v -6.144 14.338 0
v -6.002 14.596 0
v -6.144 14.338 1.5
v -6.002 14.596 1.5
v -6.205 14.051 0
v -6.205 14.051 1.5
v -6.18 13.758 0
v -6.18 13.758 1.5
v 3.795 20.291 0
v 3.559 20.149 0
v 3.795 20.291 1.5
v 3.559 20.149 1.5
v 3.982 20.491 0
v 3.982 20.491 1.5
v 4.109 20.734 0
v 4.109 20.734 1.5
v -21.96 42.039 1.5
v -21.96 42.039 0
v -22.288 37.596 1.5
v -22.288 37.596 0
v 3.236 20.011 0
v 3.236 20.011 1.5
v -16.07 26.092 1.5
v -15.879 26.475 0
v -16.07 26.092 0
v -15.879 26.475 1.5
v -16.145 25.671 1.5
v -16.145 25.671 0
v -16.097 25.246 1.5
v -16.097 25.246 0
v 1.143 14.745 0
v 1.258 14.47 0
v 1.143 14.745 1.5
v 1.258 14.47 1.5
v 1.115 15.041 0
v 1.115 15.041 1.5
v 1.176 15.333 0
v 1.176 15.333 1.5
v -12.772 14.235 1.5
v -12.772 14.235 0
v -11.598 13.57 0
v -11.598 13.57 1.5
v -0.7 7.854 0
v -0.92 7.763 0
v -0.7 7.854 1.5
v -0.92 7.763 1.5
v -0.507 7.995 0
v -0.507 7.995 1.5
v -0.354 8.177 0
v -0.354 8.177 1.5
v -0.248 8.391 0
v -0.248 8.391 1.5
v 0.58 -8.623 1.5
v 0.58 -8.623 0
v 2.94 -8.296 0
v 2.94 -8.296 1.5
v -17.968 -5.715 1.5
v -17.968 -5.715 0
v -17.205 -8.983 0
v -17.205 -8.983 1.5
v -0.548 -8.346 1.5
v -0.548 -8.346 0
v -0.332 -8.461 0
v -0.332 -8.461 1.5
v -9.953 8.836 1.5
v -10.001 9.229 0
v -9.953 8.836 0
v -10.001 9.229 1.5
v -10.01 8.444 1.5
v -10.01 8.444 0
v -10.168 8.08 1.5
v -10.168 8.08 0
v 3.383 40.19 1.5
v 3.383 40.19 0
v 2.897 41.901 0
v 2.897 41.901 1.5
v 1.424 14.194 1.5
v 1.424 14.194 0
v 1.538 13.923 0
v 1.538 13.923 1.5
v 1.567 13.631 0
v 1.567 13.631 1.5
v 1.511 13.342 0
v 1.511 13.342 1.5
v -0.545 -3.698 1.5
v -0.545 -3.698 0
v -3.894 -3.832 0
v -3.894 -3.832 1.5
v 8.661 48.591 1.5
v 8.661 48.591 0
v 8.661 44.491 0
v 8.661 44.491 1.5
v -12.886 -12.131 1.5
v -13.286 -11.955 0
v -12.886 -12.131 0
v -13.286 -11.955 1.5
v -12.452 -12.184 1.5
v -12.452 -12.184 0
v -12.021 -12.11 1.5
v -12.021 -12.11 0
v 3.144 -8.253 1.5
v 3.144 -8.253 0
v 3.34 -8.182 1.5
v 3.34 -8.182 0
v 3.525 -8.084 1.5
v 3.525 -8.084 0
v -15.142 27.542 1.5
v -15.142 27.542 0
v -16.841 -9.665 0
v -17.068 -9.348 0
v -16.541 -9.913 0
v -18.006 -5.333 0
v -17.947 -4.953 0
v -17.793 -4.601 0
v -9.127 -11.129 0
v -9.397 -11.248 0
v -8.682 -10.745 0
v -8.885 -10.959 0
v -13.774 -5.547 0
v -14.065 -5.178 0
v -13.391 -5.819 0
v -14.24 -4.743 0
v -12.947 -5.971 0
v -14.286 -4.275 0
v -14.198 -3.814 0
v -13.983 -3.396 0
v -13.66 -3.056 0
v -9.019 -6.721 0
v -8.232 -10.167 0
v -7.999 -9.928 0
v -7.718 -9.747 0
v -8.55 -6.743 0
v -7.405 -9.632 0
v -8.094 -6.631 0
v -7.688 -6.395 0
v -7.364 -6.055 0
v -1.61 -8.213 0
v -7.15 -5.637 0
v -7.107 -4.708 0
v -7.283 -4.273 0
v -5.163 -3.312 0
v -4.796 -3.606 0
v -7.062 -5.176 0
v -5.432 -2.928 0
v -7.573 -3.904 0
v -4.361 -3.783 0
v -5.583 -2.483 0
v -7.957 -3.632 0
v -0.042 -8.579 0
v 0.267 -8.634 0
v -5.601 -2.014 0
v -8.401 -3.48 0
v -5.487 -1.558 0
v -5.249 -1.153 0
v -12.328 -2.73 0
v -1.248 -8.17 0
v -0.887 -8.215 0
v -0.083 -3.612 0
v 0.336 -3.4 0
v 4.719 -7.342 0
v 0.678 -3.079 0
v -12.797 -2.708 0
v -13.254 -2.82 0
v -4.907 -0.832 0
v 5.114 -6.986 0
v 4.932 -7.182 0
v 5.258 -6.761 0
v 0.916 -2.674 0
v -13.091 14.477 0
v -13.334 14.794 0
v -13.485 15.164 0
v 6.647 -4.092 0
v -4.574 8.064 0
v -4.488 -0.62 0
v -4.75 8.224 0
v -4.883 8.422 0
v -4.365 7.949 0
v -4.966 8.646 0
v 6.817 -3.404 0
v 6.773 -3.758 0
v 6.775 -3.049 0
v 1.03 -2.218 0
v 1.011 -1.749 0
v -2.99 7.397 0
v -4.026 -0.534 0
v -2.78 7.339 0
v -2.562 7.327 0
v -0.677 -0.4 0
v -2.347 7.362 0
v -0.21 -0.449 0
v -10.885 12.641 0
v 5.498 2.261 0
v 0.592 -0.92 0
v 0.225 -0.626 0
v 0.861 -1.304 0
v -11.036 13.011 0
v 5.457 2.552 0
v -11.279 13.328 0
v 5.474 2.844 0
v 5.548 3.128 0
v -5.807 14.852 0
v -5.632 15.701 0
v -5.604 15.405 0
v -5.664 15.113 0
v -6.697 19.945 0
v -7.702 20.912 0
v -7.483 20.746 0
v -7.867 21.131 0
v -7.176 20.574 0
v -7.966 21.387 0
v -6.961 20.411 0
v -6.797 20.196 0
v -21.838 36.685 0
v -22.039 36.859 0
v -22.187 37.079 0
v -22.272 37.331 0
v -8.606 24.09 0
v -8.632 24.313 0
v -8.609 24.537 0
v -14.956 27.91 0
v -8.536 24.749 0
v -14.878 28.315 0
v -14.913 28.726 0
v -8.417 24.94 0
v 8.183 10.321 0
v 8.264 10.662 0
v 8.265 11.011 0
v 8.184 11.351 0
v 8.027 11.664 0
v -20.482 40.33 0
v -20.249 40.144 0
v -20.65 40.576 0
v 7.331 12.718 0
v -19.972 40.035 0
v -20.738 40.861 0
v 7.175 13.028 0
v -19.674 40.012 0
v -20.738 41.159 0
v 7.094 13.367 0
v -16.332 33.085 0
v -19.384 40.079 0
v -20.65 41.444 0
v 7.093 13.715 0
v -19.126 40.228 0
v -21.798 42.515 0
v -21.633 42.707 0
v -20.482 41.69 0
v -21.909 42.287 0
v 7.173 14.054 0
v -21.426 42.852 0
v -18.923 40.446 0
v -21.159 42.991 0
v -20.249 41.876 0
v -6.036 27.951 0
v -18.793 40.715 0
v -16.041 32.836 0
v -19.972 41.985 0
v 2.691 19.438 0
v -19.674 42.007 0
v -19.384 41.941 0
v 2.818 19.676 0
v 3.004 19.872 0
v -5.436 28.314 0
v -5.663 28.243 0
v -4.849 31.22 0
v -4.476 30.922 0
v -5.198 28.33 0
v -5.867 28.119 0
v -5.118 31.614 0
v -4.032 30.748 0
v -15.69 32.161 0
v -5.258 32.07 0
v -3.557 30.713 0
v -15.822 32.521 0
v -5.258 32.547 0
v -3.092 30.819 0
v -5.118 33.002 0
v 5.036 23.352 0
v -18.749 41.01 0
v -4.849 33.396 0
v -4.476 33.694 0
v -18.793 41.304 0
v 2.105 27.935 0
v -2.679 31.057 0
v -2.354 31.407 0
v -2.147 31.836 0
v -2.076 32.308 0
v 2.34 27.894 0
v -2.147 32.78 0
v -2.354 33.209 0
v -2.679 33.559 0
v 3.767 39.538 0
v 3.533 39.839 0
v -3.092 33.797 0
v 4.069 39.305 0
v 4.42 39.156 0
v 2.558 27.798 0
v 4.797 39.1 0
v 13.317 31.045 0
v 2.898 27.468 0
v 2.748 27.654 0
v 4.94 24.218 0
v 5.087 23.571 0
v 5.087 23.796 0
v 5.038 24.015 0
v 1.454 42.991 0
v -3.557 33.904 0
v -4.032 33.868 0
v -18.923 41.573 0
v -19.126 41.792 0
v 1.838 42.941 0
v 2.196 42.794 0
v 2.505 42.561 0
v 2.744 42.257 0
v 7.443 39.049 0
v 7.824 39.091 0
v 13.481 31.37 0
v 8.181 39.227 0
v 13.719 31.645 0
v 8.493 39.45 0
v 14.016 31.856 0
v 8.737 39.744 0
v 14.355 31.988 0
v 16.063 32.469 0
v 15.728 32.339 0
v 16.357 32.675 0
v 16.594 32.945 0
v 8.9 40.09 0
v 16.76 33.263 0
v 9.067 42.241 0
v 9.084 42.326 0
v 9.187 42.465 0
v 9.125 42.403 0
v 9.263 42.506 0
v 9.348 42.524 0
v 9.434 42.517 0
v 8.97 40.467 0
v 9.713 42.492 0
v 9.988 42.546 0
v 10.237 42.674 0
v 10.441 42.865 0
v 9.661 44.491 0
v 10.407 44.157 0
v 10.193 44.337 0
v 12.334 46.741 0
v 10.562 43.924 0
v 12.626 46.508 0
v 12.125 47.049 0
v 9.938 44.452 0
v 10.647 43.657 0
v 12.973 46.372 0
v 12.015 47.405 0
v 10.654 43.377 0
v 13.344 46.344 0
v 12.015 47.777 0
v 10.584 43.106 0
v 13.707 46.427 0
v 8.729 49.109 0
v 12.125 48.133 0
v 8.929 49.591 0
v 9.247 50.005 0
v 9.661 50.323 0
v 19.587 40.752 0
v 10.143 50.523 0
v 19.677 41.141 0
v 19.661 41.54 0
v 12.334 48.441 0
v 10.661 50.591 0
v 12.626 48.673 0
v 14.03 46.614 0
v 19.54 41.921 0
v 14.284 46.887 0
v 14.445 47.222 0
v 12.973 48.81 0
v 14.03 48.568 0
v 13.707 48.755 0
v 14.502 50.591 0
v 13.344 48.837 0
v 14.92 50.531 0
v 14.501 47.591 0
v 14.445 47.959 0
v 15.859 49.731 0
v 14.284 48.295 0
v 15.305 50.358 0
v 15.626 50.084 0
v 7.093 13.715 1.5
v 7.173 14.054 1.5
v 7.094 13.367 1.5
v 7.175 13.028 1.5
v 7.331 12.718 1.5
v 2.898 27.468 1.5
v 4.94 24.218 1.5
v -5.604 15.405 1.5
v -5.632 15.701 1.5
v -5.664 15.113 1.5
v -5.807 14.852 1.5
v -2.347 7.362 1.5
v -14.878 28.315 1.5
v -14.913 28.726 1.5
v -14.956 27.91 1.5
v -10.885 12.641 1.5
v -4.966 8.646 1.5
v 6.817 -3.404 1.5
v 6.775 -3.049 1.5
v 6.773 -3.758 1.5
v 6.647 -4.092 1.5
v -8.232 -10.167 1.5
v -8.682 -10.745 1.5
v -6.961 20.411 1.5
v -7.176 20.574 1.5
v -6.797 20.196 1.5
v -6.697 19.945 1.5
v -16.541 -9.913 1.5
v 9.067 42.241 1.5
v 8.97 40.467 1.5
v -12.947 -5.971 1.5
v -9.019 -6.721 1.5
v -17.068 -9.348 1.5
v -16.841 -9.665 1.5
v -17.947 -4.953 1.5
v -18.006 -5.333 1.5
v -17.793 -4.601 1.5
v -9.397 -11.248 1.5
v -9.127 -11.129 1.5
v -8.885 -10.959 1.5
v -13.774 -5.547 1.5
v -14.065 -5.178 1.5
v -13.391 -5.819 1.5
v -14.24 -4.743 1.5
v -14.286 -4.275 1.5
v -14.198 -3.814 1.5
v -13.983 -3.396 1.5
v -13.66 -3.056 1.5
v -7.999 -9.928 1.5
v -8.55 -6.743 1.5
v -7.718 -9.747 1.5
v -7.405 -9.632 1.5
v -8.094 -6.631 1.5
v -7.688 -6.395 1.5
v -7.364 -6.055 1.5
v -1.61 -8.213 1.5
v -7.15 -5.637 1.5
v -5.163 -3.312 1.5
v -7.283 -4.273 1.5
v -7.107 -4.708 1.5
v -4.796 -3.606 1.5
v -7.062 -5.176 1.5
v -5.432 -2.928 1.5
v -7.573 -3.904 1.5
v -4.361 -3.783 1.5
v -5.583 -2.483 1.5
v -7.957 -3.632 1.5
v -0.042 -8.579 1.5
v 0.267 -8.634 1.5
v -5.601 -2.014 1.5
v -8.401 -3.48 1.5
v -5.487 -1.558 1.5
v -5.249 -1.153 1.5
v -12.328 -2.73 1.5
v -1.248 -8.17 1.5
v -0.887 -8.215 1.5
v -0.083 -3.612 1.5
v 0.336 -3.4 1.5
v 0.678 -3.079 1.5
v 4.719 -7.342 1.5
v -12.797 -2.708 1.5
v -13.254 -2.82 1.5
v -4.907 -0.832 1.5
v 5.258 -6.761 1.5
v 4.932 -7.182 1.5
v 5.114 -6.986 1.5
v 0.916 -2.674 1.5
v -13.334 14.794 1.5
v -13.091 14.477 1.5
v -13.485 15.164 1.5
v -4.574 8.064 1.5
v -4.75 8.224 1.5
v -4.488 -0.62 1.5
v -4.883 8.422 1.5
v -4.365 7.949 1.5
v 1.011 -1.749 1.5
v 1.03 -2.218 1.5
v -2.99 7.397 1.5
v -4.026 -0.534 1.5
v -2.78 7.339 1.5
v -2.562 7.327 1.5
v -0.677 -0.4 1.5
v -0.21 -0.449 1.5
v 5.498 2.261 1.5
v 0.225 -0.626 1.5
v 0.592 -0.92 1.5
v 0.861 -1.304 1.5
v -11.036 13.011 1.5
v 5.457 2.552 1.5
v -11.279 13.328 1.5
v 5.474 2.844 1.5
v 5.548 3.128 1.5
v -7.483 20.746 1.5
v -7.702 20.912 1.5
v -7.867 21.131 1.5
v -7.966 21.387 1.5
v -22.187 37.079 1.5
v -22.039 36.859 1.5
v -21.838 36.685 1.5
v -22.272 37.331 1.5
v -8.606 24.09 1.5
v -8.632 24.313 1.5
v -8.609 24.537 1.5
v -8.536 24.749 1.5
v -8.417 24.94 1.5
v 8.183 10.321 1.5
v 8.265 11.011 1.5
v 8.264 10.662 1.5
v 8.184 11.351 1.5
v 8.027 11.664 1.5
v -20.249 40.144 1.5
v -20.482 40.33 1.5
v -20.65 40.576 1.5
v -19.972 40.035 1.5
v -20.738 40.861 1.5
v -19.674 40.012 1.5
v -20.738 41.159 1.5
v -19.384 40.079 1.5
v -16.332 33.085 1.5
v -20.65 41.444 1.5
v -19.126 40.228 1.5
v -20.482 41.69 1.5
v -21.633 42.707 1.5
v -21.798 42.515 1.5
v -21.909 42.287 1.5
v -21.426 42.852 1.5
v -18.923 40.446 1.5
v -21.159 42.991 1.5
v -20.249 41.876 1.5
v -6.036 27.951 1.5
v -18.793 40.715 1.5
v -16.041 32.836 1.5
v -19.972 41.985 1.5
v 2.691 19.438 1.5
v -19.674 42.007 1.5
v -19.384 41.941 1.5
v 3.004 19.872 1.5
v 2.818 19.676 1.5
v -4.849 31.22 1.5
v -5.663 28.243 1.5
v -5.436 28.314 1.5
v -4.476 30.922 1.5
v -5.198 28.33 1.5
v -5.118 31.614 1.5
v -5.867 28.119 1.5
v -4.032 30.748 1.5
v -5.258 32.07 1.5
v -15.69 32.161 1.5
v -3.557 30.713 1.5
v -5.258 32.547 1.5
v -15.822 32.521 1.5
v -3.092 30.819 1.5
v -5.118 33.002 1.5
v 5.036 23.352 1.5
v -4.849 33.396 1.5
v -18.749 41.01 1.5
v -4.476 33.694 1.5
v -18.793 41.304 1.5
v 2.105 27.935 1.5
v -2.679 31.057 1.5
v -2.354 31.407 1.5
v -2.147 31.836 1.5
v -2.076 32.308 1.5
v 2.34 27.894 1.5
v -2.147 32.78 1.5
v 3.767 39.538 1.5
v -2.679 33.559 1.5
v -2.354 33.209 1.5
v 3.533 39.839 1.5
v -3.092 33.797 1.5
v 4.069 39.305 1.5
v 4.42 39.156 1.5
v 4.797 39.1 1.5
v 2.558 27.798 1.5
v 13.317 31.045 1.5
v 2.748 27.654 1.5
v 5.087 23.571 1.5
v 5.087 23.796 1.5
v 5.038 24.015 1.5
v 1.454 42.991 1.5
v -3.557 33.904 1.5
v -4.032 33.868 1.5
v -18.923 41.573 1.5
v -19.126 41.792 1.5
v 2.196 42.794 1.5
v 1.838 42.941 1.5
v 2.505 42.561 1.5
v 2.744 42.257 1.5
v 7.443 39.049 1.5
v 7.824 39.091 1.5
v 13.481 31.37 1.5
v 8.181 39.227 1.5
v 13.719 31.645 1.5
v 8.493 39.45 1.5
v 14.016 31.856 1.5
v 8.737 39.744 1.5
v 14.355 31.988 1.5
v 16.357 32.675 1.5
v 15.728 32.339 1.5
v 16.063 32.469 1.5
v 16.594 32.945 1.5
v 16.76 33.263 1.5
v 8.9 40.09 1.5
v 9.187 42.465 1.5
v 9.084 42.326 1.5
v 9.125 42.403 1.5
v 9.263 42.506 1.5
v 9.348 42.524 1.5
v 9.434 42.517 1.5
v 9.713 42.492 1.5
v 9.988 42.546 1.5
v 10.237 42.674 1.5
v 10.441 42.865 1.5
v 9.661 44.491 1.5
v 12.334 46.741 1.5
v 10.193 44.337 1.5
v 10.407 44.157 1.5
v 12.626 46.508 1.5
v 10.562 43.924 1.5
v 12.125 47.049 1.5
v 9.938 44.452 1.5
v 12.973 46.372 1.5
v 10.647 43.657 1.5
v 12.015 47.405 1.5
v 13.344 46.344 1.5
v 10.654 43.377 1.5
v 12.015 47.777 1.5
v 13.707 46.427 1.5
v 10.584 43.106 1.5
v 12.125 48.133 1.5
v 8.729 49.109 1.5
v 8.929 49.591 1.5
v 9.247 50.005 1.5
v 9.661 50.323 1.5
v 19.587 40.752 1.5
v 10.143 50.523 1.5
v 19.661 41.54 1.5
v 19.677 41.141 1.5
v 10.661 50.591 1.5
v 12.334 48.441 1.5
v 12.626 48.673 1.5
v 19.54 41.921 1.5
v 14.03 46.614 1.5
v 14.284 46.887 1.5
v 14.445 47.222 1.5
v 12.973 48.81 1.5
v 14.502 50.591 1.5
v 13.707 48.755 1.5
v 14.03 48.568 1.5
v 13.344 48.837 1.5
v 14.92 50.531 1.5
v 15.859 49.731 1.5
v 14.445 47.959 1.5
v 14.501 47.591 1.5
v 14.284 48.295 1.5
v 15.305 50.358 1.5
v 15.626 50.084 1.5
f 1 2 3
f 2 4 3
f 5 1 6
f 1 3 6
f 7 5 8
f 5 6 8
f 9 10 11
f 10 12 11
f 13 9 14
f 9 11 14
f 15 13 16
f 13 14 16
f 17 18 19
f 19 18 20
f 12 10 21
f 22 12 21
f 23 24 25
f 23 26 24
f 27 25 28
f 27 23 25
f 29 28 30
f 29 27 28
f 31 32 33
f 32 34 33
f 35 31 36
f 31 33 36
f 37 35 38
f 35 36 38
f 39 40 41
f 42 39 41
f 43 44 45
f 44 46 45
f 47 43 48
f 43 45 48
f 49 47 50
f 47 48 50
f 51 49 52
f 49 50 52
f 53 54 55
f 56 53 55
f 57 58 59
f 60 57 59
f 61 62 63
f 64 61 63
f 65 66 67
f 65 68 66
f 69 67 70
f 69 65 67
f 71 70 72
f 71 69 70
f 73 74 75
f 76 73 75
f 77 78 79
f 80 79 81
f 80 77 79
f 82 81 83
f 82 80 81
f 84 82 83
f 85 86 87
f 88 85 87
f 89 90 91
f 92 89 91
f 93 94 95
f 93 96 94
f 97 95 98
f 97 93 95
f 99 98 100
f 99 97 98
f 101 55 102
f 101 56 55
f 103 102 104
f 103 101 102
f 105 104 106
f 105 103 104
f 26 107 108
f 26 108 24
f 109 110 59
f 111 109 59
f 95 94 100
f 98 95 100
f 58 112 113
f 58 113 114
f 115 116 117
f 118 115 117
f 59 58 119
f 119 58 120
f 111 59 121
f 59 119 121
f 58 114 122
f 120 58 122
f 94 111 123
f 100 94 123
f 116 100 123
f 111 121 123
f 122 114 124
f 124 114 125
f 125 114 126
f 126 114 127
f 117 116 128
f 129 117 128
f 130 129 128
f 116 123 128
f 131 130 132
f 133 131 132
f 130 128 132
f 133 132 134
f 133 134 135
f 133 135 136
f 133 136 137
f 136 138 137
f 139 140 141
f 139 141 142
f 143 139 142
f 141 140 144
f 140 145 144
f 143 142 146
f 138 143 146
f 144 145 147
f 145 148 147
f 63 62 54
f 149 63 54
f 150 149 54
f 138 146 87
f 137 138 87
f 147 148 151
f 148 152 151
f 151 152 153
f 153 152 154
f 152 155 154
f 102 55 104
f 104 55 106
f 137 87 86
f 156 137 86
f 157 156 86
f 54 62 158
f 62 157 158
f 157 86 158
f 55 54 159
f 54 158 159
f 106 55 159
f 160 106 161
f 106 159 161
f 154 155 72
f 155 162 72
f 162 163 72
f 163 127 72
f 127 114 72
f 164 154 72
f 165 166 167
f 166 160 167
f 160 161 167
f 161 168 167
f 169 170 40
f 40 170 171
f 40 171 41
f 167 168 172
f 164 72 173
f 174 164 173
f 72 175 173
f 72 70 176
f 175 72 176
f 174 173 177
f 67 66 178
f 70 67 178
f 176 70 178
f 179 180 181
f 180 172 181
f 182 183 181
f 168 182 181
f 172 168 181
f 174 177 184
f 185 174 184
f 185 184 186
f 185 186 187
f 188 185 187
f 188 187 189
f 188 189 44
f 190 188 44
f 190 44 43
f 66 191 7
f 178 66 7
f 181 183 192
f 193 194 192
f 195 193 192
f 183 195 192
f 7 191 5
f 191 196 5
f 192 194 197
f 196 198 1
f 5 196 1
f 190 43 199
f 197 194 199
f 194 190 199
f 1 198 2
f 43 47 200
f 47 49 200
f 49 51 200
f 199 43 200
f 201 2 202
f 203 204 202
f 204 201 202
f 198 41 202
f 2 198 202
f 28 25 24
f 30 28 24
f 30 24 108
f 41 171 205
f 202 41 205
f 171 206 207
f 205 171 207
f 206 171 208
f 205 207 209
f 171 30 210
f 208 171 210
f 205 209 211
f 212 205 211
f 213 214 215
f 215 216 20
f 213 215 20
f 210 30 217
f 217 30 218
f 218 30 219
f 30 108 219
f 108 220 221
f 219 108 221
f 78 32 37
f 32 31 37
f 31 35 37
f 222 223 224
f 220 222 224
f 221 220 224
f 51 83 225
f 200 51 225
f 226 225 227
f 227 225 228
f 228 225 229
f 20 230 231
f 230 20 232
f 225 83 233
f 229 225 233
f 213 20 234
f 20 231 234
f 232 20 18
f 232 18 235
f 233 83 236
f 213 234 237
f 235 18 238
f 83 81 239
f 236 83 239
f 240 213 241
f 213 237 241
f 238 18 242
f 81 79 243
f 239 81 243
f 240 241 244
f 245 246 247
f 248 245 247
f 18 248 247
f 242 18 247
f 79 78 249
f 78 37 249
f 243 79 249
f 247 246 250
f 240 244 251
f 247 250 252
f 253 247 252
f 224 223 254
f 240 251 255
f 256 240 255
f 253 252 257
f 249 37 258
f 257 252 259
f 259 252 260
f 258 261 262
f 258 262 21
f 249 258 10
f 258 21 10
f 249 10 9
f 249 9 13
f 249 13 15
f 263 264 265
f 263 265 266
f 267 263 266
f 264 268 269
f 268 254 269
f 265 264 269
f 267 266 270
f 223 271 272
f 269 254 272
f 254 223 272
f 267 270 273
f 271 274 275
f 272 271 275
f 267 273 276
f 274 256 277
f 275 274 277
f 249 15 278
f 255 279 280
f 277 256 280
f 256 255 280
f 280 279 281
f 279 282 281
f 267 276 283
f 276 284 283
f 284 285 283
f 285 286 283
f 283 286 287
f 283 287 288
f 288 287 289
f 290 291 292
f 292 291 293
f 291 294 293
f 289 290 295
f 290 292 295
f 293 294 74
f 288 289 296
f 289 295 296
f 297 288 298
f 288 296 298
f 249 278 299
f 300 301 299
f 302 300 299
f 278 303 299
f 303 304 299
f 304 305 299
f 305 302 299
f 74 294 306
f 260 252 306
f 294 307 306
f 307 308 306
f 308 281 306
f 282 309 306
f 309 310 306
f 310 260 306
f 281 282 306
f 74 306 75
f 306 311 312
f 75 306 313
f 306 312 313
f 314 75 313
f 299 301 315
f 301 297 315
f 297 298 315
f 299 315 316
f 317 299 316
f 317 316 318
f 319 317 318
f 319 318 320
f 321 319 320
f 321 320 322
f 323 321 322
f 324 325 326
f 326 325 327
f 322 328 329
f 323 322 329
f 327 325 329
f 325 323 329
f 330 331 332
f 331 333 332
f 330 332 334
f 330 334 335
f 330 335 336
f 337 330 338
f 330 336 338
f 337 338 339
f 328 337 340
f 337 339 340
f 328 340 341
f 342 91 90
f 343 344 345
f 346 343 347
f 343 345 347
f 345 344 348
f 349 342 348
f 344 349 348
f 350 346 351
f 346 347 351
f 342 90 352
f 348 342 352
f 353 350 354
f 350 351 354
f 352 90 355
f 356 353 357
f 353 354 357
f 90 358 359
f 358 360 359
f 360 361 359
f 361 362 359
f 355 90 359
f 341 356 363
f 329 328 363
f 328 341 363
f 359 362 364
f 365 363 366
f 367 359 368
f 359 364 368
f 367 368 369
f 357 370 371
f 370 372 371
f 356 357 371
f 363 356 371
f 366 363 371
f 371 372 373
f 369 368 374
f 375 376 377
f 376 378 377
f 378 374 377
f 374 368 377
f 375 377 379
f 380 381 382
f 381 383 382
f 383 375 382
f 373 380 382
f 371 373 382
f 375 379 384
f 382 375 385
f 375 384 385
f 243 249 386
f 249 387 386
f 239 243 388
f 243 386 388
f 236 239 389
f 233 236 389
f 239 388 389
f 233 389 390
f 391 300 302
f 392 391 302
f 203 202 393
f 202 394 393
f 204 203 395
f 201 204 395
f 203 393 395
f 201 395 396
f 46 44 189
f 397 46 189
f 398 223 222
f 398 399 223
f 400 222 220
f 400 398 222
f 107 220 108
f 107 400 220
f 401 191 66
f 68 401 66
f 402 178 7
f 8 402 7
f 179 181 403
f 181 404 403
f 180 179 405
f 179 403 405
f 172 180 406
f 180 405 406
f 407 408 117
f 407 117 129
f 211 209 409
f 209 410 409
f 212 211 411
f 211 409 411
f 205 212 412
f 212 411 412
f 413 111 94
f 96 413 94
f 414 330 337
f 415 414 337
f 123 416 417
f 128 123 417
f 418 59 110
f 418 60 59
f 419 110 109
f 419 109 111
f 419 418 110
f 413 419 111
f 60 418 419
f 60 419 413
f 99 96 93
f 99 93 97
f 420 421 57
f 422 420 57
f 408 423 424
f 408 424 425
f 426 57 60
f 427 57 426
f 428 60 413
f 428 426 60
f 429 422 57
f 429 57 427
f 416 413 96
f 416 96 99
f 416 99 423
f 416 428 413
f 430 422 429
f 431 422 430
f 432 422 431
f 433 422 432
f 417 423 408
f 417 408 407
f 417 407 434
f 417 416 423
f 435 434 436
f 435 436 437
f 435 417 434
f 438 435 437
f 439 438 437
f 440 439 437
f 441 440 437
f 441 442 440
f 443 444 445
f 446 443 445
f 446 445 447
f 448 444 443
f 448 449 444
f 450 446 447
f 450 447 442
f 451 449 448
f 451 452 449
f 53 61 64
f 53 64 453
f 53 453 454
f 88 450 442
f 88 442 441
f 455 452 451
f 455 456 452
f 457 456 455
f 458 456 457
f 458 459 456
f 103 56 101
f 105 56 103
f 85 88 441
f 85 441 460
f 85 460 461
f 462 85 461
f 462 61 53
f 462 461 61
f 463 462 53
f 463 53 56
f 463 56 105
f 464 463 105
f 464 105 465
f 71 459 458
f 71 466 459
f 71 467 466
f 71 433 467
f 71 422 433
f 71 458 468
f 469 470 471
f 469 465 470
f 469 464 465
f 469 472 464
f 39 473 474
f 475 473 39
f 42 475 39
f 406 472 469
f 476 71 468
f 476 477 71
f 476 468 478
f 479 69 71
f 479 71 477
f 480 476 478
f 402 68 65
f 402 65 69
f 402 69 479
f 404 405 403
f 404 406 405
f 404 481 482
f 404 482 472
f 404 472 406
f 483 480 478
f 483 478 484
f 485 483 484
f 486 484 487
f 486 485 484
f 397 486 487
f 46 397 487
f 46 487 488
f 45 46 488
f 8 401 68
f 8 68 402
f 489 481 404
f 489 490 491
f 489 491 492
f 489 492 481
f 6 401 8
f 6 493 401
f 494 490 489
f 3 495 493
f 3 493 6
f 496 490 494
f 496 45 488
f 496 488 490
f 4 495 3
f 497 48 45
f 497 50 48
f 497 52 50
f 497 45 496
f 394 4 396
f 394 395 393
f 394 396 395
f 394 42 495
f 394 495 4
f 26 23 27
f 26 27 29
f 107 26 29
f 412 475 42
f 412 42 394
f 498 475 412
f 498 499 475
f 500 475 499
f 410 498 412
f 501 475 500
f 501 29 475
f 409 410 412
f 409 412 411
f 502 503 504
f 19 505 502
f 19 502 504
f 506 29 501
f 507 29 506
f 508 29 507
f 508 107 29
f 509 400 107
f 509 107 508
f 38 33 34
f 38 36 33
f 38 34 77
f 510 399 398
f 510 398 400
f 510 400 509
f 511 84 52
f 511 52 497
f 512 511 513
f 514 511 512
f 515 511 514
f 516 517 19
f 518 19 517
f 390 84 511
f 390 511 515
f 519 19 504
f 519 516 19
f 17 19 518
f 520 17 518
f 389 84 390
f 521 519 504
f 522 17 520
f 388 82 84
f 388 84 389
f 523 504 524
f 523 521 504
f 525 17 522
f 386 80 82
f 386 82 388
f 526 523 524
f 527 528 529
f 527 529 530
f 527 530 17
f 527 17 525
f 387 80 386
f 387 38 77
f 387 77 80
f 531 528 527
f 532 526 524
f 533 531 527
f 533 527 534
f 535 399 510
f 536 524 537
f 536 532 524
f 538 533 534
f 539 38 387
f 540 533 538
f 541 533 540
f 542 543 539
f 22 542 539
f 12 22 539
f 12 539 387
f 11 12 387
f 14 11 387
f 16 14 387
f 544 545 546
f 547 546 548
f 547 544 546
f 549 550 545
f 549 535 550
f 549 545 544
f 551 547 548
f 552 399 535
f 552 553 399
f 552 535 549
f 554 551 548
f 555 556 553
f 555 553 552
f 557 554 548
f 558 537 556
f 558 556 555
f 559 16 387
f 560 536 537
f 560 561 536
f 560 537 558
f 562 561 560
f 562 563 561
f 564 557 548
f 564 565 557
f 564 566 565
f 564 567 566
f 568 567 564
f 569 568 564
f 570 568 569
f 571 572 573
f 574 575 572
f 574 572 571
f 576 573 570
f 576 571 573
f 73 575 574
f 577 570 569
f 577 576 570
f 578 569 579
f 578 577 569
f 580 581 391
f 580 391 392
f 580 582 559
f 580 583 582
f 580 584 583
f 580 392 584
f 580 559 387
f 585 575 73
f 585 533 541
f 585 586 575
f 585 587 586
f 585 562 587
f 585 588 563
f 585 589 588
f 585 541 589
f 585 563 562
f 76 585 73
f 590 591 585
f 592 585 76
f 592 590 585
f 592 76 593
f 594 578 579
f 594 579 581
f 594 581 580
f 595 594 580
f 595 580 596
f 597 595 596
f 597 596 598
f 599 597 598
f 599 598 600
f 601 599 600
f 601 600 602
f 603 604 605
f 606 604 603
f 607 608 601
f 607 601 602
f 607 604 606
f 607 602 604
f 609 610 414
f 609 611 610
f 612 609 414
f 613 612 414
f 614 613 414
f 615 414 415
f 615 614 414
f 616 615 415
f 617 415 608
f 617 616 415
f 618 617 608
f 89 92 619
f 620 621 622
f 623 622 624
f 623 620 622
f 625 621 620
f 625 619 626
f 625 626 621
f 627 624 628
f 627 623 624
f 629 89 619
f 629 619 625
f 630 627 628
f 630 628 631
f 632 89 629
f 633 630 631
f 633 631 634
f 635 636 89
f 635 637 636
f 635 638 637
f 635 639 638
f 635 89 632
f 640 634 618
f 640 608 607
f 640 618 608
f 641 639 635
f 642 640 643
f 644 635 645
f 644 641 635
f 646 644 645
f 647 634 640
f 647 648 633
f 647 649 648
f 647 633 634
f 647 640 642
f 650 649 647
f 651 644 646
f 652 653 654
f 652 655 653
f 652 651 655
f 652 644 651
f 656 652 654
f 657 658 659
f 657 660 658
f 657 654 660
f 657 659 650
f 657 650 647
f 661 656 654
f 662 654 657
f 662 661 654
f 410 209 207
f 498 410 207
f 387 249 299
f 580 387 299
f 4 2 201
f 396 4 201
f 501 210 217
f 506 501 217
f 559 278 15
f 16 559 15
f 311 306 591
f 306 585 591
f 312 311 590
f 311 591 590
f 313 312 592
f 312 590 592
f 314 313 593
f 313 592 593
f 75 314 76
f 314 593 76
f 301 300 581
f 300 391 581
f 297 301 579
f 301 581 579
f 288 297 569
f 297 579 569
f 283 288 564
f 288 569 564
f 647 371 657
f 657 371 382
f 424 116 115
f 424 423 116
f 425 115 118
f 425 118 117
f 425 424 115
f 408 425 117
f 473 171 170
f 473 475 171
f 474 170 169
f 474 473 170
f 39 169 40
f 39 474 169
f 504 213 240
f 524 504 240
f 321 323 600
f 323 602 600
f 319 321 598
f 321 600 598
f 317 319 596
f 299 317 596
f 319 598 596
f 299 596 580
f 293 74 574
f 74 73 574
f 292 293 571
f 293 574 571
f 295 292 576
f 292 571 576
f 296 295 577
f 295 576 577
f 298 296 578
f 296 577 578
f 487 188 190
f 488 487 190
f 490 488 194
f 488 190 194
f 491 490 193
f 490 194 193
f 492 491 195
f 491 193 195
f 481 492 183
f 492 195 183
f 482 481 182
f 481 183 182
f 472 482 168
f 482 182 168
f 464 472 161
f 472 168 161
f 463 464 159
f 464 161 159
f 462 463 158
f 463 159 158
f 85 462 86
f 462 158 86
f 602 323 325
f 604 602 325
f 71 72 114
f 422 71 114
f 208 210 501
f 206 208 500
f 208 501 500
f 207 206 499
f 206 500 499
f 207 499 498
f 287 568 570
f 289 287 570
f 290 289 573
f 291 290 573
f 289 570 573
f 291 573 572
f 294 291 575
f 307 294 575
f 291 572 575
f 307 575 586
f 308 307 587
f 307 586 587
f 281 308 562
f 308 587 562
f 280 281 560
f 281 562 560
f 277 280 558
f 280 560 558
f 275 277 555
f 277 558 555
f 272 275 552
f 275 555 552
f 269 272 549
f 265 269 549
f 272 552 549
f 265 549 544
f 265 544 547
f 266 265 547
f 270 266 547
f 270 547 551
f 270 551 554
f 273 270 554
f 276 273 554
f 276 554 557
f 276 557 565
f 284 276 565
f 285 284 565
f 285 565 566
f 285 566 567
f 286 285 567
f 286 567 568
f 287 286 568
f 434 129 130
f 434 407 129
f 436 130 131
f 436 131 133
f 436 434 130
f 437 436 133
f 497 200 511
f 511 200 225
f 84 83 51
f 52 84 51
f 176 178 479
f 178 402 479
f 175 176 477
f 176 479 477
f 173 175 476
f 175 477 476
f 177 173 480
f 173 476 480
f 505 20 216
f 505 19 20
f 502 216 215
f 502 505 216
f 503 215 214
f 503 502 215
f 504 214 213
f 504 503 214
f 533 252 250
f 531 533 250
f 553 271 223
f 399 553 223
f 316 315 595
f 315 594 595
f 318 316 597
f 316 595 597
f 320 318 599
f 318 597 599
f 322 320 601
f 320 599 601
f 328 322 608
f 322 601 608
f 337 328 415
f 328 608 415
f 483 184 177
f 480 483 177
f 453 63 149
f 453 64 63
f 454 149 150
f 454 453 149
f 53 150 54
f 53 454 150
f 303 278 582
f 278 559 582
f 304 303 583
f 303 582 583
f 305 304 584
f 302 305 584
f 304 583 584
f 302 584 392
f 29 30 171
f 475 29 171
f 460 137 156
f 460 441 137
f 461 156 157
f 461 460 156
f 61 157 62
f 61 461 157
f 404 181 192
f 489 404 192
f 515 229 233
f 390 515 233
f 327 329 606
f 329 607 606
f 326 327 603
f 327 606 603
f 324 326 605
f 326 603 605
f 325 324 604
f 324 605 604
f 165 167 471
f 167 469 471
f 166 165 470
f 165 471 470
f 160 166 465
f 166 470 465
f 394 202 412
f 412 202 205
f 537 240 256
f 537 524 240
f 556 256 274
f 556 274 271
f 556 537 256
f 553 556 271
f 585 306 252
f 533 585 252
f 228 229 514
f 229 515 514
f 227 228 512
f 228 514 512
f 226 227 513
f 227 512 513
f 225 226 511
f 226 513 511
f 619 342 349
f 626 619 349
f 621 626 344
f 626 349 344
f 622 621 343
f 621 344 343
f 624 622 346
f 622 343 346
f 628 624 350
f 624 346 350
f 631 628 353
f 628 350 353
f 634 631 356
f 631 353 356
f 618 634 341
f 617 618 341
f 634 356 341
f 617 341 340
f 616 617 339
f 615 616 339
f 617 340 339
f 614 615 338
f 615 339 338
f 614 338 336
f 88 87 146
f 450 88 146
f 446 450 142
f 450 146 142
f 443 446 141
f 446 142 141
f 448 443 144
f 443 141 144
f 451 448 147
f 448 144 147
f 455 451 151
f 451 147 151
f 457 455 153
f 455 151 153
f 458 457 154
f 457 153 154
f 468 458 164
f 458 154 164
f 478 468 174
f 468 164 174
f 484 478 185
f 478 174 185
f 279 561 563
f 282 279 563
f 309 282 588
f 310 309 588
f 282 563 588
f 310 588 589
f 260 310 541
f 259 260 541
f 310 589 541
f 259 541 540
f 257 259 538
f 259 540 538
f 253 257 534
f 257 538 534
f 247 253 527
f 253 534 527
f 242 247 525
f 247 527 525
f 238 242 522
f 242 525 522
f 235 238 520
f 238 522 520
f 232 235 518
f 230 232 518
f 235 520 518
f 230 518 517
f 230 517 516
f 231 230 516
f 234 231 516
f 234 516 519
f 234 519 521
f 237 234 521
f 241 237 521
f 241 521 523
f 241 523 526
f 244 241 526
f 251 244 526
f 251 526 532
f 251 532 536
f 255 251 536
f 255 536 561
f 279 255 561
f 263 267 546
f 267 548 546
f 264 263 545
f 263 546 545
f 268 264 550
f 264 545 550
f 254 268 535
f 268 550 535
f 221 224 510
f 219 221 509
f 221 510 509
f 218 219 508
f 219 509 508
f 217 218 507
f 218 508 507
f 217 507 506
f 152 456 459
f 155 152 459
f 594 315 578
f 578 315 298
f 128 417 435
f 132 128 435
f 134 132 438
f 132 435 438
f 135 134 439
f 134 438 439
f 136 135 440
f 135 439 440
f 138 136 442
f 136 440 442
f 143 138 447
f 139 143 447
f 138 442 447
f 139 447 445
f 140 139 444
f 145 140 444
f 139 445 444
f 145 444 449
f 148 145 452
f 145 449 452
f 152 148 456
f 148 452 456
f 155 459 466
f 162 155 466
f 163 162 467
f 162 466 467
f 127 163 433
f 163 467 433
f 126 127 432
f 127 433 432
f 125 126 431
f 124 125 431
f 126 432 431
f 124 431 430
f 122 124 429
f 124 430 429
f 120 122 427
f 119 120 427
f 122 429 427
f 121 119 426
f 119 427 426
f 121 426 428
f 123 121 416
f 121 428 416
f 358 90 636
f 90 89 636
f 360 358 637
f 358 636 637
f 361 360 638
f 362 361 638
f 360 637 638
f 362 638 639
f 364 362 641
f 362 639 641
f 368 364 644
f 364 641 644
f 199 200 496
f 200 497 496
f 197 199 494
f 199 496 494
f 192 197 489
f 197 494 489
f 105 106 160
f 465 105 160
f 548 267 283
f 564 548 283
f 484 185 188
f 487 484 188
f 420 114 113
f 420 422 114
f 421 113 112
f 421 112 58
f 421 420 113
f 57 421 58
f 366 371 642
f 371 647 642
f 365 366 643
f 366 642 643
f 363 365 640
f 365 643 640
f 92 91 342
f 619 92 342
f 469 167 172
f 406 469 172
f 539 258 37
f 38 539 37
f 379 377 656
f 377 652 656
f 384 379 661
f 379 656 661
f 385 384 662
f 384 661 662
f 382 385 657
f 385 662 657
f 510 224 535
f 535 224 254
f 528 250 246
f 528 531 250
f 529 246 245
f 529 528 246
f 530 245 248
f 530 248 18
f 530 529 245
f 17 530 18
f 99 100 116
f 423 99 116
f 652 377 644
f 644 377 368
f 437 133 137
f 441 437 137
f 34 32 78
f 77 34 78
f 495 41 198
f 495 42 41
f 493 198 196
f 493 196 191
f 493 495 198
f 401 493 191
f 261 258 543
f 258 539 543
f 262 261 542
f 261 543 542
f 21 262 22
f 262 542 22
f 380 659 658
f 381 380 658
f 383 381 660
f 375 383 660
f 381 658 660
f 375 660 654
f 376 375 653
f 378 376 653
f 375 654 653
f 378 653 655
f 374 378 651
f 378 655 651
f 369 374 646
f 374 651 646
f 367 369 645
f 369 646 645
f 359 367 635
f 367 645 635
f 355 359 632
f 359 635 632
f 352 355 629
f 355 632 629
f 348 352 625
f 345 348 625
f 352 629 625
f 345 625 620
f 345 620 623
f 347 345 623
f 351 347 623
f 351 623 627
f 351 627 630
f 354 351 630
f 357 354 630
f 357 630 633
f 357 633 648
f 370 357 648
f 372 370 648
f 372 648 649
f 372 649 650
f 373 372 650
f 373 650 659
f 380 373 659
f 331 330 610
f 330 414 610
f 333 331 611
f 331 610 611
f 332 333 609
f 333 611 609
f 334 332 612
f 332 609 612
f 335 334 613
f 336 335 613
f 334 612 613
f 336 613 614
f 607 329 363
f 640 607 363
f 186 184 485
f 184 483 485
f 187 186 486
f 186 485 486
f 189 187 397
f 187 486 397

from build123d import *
from OCP.BRepFilletAPI import BRepFilletAPI_MakeFillet

# Parameters (mm, degrees)
CUT_EXTRUDE1_START         = -1.5
CUT_EXTRUDE1_DEPTH         = 1.5
CUT_EXTRUDE2_DEPTH         = 56.320855182
CUT_EXTRUDE3_DEPTH         = 56.320855182
FILLET1_R1                 = 2
FILLET1_R2                 = 1.5
FILLET1_R3                 = 1.5
FILLET1_R4                 = 1.5
FILLET1_R5                 = 1
FILLET1_R6                 = 1
FILLET1_R7                 = 0.3
F_2_0_2_DIAMETER_HOLE1_D   = 2
F_2_5_2_5_DIAMETER_HOLE1_D = 2.5
F_3_2_3_2_DIAMETER_HOLE1_D = 3.2


with BuildPart() as part:
    # Cut-Extrude1: read off the stored shape, not the designer's step
    # Cut-Extrude1 outline → Cut-Extrude1 (new body)
    with BuildSketch(Plane.XY.offset(1.5).offset(CUT_EXTRUDE1_START)):
        with BuildLine():
            Line((-21.15922941, 42.990956489), (-21.918524362, 42.593852668))
            Line((-21.918524362, 42.593852668), (-22.331690837, 37.008180338))
            Line((-22.331690837, 37.008180338), (-15.823880633, 32.753073704))
            Line((-15.823880633, 32.753073704), (-14.767696121, 28.083626208))
            Line((-14.767696121, 28.083626208), (-16.26955663, 25.9101387))
            Line((-16.26955663, 25.9101387), (-13.325866142, 14.548277254))
            Line((-13.325866142, 14.548277254), (-11.044500218, 13.256714261))
            Line((-11.044500218, 13.256714261), (-9.843169723, 8.619898436))
            Line((-9.843169723, 8.619898436), (-18.106030722, -5.122739041))
            Line((-18.106030722, -5.122739041), (-17.064214449, -9.58485809))
            Line((-17.064214449, -9.58485809), (-12.690100502, -12.329039203))
            Line((-12.690100502, -12.329039203), (-8.962822896, -11.10580142))
            Line((-8.962822896, -11.10580142), (-7.911354227, -9.756154848))
            Line((-7.911354227, -9.756154848), (-1.053266461, -8.076943446))
            Line((-1.053266461, -8.076943446), (0.097779189, -8.690341842))
            Line((0.097779189, -8.690341842), (3.254584825, -8.251896615))
            Line((3.254584825, -8.251896615), (5.068180176, -7.125558451))
            Line((5.068180176, -7.125558451), (6.906602667, -3.594529202))
            Line((6.906602667, -3.594529202), (5.391678643, 2.702231034))
            Line((5.391678643, 2.702231034), (8.443636754, 11.032011447))
            Line((8.443636754, 11.032011447), (6.916630149, 13.34590119))
            Line((6.916630149, 13.34590119), (13.586412116, 31.791123225))
            Line((13.586412116, 31.791123225), (16.484018961, 32.532910561))
            Line((16.484018961, 32.532910561), (19.81145552, 41.346140579))
            Line((19.81145552, 41.346140579), (15.452897729, 50.590933994))
            Line((15.452897729, 50.590933994), (8.66072149, 50.590933994))
            Line((8.66072149, 50.590933994), (8.66072149, 44.490933994))
            Line((8.66072149, 44.490933994), (9.66072149, 44.490933994))
            ThreePointArc((9.66072149, 44.490933994), (10.615066101, 43.192226171), (9.090581088, 42.66938672))
            Line((9.090581088, 42.66938672), (8.890254379, 39.021331889))
            Line((8.890254379, 39.021331889), (3.686776041, 39.121354833))
            Line((3.686776041, 39.121354833), (2.58727318, 42.990956489))
            Line((2.58727318, 42.990956489), (-21.15922941, 42.990956489))
        make_face()
        with BuildLine():
            ThreePointArc((-3.894243345, -3.831676855), (-5.608872185, -2.248942531), (-4.026137862, -0.534313691))
            Line((-4.026137862, -0.534313691), (-0.677019452, -0.400348965))
            ThreePointArc((-0.677019452, -0.400348965), (1.037609388, -1.983083289), (-0.545124935, -3.697712129))
            Line((-0.545124935, -3.697712129), (-3.894243345, -3.831676855))
        make_face(mode=Mode.SUBTRACT)
    extrude(amount=CUT_EXTRUDE1_DEPTH)

    # Sketch2 → Cut-Extrude2 (cut, through all)
    with BuildSketch(Plane.XY.offset(1.5)):
        with BuildLine():
            Line((-8.400629557, -3.479539033), (-12.328216542, -2.729986131))
            ThreePointArc((-12.328216542, -2.729986131), (-14.258274586, -4.041426541), (-12.946834177, -5.971484585))
            Line((-12.946834177, -5.971484585), (-9.019247192, -6.721037486))
            ThreePointArc((-9.019247192, -6.721037486), (-7.089189148, -5.409597077), (-8.400629557, -3.479539033))
        make_face()
    extrude(amount=-CUT_EXTRUDE2_DEPTH, mode=Mode.SUBTRACT)

    # Sketch3 → Cut-Extrude3 (cut, through all)
    with BuildSketch(Plane(origin=(0, 0, 0), x_dir=(-1, 0, 0), z_dir=(0, 0, -1))):
        Polygon((-1.669040668, 13.788566276), (0.421242883, 7.902808428), (2.674335505, 7.270595549), (4.846116127, 8.142081874), (6.289526399, 14.218922957), (5.51540188, 15.234387716), (6.801285994, 20.3627961), (7.865027392, 20.96090236), (8.717011471, 24.560534964), (5.714933344, 28.35768306), (-2.622436807, 27.906842737), (-5.197547994, 23.808110114), (-3.962369217, 20.321340098), (-2.840334409, 19.841428909), (-1.008931735, 14.881586698), align=None)
    extrude(amount=-CUT_EXTRUDE3_DEPTH, mode=Mode.SUBTRACT)

    # Fillet1: one fillet with a radius per group of edges: ONE call of the kernel's fillet builder (fillet() takes one radius for all edges)
    fillet1_edges_1 = [part.edges().sort_by_distance(p)[0] for p in [
        (8.66072149, 50.590933994, 0.75),
    ]]
    fillet1_edges_2 = [part.edges().sort_by_distance(p)[0] for p in [
        (-13.325866142, 14.548277254, 0.75),
        (2.58727318, 42.990956489, 0.75),
        (8.890254379, 39.021331889, 0.75),
        (-8.962822896, -11.10580142, 0.75),
        (-17.064214449, -9.58485809, 0.75),
        (-9.843169723, 8.619898436, 0.75),
        (-15.823880633, 32.753073704, 0.75),
        (13.586412116, 31.791123225, 0.75),
        (-12.690100502, -12.329039203, 0.75),
        (8.443636754, 11.032011447, 0.75),
        (-18.106030722, -5.122739041, 0.75),
        (5.391678643, 2.702231034, 0.75),
        (-11.044500218, 13.256714261, 0.75),
        (6.906602667, -3.594529202, 0.75),
        (-16.26955663, 25.9101387, 0.75),
        (3.686776041, 39.121354833, 0.75),
        (3.254584825, -8.251896615, 0.75),
        (16.484018961, 32.532910561, 0.75),
        (0.097779189, -8.690341842, 0.75),
        (-7.911354227, -9.756154848, 0.75),
        (-14.767696121, 28.083626208, 0.75),
    ]]
    fillet1_edges_3 = [part.edges().sort_by_distance(p)[0] for p in [
        (15.452897729, 50.590933994, 0.75),
        (19.81145552, 41.346140579, 0.75),
    ]]
    fillet1_edges_4 = [part.edges().sort_by_distance(p)[0] for p in [
        (-1.053266461, -8.076943446, 0.75),
        (6.916630149, 13.34590119, 0.75),
        (5.068180176, -7.125558451, 0.75),
    ]]
    fillet1_edges_5 = [part.edges().sort_by_distance(p)[0] for p in [
        (-6.801285994, 20.3627961, 0.75),
        (5.197547994, 23.808110114, 0.75),
    ]]
    fillet1_edges_6 = [part.edges().sort_by_distance(p)[0] for p in [
        (1.008931735, 14.881586698, 0.75),
        (1.669040668, 13.788566276, 0.75),
        (-21.918524362, 42.593852668, 0.75),
        (2.840334409, 19.841428909, 0.75),
        (-22.331690837, 37.008180338, 0.75),
        (-0.421242883, 7.902808428, 0.75),
        (-6.289526399, 14.218922957, 0.75),
        (-2.674335505, 7.270595549, 0.75),
        (-5.51540188, 15.234387716, 0.75),
        (-4.846116127, 8.142081874, 0.75),
        (3.962369217, 20.321340098, 0.75),
        (2.622436807, 27.906842737, 0.75),
        (-7.865027392, 20.96090236, 0.75),
        (-5.714933344, 28.35768306, 0.75),
        (-8.717011471, 24.560534964, 0.75),
    ]]
    fillet1_edges_7 = [part.edges().sort_by_distance(p)[0] for p in [
        (9.090581088, 42.66938672, 0.75),
    ]]
    fillet1 = BRepFilletAPI_MakeFillet(part.part.solid().wrapped)
    for e in fillet1_edges_1:
        fillet1.Add(FILLET1_R1, e.wrapped)
    for e in fillet1_edges_2:
        fillet1.Add(FILLET1_R2, e.wrapped)
    for e in fillet1_edges_3:
        fillet1.Add(FILLET1_R3, e.wrapped)
    for e in fillet1_edges_4:
        fillet1.Add(FILLET1_R4, e.wrapped)
    for e in fillet1_edges_5:
        fillet1.Add(FILLET1_R5, e.wrapped)
    for e in fillet1_edges_6:
        fillet1.Add(FILLET1_R6, e.wrapped)
    for e in fillet1_edges_7:
        fillet1.Add(FILLET1_R7, e.wrapped)
    add(Compound.cast(fillet1.Shape()), mode=Mode.REPLACE)

    # Ø2.0 (2) Diameter Hole1 (through all)
    with Locations(Plane(origin=(0, 0, 0), x_dir=(-1, 0, 0), z_dir=(0, 0, -1))):
        with Locations((19.749063689, 41.009673781)):
            Hole(F_2_0_2_DIAMETER_HOLE1_D / 2)

    # Ø2.5 (2.5) Diameter Hole1 (through all)
    with Locations(Plane(origin=(0, 0, 0), x_dir=(-1, 0, 0), z_dir=(0, 0, -1))):
        with Locations((-13.25072149, 47.590933994)):
            Hole(F_2_5_2_5_DIAMETER_HOLE1_D / 2)

    # Ø3.2 (3.2) Diameter Hole1 (through all)
    with Locations(Plane(origin=(0, 0, 0), x_dir=(-1, 0, 0), z_dir=(0, 0, -1))):
        with Locations((3.676270681, 32.308049922)):
            Hole(F_3_2_3_2_DIAMETER_HOLE1_D / 2)


solid = part.part
